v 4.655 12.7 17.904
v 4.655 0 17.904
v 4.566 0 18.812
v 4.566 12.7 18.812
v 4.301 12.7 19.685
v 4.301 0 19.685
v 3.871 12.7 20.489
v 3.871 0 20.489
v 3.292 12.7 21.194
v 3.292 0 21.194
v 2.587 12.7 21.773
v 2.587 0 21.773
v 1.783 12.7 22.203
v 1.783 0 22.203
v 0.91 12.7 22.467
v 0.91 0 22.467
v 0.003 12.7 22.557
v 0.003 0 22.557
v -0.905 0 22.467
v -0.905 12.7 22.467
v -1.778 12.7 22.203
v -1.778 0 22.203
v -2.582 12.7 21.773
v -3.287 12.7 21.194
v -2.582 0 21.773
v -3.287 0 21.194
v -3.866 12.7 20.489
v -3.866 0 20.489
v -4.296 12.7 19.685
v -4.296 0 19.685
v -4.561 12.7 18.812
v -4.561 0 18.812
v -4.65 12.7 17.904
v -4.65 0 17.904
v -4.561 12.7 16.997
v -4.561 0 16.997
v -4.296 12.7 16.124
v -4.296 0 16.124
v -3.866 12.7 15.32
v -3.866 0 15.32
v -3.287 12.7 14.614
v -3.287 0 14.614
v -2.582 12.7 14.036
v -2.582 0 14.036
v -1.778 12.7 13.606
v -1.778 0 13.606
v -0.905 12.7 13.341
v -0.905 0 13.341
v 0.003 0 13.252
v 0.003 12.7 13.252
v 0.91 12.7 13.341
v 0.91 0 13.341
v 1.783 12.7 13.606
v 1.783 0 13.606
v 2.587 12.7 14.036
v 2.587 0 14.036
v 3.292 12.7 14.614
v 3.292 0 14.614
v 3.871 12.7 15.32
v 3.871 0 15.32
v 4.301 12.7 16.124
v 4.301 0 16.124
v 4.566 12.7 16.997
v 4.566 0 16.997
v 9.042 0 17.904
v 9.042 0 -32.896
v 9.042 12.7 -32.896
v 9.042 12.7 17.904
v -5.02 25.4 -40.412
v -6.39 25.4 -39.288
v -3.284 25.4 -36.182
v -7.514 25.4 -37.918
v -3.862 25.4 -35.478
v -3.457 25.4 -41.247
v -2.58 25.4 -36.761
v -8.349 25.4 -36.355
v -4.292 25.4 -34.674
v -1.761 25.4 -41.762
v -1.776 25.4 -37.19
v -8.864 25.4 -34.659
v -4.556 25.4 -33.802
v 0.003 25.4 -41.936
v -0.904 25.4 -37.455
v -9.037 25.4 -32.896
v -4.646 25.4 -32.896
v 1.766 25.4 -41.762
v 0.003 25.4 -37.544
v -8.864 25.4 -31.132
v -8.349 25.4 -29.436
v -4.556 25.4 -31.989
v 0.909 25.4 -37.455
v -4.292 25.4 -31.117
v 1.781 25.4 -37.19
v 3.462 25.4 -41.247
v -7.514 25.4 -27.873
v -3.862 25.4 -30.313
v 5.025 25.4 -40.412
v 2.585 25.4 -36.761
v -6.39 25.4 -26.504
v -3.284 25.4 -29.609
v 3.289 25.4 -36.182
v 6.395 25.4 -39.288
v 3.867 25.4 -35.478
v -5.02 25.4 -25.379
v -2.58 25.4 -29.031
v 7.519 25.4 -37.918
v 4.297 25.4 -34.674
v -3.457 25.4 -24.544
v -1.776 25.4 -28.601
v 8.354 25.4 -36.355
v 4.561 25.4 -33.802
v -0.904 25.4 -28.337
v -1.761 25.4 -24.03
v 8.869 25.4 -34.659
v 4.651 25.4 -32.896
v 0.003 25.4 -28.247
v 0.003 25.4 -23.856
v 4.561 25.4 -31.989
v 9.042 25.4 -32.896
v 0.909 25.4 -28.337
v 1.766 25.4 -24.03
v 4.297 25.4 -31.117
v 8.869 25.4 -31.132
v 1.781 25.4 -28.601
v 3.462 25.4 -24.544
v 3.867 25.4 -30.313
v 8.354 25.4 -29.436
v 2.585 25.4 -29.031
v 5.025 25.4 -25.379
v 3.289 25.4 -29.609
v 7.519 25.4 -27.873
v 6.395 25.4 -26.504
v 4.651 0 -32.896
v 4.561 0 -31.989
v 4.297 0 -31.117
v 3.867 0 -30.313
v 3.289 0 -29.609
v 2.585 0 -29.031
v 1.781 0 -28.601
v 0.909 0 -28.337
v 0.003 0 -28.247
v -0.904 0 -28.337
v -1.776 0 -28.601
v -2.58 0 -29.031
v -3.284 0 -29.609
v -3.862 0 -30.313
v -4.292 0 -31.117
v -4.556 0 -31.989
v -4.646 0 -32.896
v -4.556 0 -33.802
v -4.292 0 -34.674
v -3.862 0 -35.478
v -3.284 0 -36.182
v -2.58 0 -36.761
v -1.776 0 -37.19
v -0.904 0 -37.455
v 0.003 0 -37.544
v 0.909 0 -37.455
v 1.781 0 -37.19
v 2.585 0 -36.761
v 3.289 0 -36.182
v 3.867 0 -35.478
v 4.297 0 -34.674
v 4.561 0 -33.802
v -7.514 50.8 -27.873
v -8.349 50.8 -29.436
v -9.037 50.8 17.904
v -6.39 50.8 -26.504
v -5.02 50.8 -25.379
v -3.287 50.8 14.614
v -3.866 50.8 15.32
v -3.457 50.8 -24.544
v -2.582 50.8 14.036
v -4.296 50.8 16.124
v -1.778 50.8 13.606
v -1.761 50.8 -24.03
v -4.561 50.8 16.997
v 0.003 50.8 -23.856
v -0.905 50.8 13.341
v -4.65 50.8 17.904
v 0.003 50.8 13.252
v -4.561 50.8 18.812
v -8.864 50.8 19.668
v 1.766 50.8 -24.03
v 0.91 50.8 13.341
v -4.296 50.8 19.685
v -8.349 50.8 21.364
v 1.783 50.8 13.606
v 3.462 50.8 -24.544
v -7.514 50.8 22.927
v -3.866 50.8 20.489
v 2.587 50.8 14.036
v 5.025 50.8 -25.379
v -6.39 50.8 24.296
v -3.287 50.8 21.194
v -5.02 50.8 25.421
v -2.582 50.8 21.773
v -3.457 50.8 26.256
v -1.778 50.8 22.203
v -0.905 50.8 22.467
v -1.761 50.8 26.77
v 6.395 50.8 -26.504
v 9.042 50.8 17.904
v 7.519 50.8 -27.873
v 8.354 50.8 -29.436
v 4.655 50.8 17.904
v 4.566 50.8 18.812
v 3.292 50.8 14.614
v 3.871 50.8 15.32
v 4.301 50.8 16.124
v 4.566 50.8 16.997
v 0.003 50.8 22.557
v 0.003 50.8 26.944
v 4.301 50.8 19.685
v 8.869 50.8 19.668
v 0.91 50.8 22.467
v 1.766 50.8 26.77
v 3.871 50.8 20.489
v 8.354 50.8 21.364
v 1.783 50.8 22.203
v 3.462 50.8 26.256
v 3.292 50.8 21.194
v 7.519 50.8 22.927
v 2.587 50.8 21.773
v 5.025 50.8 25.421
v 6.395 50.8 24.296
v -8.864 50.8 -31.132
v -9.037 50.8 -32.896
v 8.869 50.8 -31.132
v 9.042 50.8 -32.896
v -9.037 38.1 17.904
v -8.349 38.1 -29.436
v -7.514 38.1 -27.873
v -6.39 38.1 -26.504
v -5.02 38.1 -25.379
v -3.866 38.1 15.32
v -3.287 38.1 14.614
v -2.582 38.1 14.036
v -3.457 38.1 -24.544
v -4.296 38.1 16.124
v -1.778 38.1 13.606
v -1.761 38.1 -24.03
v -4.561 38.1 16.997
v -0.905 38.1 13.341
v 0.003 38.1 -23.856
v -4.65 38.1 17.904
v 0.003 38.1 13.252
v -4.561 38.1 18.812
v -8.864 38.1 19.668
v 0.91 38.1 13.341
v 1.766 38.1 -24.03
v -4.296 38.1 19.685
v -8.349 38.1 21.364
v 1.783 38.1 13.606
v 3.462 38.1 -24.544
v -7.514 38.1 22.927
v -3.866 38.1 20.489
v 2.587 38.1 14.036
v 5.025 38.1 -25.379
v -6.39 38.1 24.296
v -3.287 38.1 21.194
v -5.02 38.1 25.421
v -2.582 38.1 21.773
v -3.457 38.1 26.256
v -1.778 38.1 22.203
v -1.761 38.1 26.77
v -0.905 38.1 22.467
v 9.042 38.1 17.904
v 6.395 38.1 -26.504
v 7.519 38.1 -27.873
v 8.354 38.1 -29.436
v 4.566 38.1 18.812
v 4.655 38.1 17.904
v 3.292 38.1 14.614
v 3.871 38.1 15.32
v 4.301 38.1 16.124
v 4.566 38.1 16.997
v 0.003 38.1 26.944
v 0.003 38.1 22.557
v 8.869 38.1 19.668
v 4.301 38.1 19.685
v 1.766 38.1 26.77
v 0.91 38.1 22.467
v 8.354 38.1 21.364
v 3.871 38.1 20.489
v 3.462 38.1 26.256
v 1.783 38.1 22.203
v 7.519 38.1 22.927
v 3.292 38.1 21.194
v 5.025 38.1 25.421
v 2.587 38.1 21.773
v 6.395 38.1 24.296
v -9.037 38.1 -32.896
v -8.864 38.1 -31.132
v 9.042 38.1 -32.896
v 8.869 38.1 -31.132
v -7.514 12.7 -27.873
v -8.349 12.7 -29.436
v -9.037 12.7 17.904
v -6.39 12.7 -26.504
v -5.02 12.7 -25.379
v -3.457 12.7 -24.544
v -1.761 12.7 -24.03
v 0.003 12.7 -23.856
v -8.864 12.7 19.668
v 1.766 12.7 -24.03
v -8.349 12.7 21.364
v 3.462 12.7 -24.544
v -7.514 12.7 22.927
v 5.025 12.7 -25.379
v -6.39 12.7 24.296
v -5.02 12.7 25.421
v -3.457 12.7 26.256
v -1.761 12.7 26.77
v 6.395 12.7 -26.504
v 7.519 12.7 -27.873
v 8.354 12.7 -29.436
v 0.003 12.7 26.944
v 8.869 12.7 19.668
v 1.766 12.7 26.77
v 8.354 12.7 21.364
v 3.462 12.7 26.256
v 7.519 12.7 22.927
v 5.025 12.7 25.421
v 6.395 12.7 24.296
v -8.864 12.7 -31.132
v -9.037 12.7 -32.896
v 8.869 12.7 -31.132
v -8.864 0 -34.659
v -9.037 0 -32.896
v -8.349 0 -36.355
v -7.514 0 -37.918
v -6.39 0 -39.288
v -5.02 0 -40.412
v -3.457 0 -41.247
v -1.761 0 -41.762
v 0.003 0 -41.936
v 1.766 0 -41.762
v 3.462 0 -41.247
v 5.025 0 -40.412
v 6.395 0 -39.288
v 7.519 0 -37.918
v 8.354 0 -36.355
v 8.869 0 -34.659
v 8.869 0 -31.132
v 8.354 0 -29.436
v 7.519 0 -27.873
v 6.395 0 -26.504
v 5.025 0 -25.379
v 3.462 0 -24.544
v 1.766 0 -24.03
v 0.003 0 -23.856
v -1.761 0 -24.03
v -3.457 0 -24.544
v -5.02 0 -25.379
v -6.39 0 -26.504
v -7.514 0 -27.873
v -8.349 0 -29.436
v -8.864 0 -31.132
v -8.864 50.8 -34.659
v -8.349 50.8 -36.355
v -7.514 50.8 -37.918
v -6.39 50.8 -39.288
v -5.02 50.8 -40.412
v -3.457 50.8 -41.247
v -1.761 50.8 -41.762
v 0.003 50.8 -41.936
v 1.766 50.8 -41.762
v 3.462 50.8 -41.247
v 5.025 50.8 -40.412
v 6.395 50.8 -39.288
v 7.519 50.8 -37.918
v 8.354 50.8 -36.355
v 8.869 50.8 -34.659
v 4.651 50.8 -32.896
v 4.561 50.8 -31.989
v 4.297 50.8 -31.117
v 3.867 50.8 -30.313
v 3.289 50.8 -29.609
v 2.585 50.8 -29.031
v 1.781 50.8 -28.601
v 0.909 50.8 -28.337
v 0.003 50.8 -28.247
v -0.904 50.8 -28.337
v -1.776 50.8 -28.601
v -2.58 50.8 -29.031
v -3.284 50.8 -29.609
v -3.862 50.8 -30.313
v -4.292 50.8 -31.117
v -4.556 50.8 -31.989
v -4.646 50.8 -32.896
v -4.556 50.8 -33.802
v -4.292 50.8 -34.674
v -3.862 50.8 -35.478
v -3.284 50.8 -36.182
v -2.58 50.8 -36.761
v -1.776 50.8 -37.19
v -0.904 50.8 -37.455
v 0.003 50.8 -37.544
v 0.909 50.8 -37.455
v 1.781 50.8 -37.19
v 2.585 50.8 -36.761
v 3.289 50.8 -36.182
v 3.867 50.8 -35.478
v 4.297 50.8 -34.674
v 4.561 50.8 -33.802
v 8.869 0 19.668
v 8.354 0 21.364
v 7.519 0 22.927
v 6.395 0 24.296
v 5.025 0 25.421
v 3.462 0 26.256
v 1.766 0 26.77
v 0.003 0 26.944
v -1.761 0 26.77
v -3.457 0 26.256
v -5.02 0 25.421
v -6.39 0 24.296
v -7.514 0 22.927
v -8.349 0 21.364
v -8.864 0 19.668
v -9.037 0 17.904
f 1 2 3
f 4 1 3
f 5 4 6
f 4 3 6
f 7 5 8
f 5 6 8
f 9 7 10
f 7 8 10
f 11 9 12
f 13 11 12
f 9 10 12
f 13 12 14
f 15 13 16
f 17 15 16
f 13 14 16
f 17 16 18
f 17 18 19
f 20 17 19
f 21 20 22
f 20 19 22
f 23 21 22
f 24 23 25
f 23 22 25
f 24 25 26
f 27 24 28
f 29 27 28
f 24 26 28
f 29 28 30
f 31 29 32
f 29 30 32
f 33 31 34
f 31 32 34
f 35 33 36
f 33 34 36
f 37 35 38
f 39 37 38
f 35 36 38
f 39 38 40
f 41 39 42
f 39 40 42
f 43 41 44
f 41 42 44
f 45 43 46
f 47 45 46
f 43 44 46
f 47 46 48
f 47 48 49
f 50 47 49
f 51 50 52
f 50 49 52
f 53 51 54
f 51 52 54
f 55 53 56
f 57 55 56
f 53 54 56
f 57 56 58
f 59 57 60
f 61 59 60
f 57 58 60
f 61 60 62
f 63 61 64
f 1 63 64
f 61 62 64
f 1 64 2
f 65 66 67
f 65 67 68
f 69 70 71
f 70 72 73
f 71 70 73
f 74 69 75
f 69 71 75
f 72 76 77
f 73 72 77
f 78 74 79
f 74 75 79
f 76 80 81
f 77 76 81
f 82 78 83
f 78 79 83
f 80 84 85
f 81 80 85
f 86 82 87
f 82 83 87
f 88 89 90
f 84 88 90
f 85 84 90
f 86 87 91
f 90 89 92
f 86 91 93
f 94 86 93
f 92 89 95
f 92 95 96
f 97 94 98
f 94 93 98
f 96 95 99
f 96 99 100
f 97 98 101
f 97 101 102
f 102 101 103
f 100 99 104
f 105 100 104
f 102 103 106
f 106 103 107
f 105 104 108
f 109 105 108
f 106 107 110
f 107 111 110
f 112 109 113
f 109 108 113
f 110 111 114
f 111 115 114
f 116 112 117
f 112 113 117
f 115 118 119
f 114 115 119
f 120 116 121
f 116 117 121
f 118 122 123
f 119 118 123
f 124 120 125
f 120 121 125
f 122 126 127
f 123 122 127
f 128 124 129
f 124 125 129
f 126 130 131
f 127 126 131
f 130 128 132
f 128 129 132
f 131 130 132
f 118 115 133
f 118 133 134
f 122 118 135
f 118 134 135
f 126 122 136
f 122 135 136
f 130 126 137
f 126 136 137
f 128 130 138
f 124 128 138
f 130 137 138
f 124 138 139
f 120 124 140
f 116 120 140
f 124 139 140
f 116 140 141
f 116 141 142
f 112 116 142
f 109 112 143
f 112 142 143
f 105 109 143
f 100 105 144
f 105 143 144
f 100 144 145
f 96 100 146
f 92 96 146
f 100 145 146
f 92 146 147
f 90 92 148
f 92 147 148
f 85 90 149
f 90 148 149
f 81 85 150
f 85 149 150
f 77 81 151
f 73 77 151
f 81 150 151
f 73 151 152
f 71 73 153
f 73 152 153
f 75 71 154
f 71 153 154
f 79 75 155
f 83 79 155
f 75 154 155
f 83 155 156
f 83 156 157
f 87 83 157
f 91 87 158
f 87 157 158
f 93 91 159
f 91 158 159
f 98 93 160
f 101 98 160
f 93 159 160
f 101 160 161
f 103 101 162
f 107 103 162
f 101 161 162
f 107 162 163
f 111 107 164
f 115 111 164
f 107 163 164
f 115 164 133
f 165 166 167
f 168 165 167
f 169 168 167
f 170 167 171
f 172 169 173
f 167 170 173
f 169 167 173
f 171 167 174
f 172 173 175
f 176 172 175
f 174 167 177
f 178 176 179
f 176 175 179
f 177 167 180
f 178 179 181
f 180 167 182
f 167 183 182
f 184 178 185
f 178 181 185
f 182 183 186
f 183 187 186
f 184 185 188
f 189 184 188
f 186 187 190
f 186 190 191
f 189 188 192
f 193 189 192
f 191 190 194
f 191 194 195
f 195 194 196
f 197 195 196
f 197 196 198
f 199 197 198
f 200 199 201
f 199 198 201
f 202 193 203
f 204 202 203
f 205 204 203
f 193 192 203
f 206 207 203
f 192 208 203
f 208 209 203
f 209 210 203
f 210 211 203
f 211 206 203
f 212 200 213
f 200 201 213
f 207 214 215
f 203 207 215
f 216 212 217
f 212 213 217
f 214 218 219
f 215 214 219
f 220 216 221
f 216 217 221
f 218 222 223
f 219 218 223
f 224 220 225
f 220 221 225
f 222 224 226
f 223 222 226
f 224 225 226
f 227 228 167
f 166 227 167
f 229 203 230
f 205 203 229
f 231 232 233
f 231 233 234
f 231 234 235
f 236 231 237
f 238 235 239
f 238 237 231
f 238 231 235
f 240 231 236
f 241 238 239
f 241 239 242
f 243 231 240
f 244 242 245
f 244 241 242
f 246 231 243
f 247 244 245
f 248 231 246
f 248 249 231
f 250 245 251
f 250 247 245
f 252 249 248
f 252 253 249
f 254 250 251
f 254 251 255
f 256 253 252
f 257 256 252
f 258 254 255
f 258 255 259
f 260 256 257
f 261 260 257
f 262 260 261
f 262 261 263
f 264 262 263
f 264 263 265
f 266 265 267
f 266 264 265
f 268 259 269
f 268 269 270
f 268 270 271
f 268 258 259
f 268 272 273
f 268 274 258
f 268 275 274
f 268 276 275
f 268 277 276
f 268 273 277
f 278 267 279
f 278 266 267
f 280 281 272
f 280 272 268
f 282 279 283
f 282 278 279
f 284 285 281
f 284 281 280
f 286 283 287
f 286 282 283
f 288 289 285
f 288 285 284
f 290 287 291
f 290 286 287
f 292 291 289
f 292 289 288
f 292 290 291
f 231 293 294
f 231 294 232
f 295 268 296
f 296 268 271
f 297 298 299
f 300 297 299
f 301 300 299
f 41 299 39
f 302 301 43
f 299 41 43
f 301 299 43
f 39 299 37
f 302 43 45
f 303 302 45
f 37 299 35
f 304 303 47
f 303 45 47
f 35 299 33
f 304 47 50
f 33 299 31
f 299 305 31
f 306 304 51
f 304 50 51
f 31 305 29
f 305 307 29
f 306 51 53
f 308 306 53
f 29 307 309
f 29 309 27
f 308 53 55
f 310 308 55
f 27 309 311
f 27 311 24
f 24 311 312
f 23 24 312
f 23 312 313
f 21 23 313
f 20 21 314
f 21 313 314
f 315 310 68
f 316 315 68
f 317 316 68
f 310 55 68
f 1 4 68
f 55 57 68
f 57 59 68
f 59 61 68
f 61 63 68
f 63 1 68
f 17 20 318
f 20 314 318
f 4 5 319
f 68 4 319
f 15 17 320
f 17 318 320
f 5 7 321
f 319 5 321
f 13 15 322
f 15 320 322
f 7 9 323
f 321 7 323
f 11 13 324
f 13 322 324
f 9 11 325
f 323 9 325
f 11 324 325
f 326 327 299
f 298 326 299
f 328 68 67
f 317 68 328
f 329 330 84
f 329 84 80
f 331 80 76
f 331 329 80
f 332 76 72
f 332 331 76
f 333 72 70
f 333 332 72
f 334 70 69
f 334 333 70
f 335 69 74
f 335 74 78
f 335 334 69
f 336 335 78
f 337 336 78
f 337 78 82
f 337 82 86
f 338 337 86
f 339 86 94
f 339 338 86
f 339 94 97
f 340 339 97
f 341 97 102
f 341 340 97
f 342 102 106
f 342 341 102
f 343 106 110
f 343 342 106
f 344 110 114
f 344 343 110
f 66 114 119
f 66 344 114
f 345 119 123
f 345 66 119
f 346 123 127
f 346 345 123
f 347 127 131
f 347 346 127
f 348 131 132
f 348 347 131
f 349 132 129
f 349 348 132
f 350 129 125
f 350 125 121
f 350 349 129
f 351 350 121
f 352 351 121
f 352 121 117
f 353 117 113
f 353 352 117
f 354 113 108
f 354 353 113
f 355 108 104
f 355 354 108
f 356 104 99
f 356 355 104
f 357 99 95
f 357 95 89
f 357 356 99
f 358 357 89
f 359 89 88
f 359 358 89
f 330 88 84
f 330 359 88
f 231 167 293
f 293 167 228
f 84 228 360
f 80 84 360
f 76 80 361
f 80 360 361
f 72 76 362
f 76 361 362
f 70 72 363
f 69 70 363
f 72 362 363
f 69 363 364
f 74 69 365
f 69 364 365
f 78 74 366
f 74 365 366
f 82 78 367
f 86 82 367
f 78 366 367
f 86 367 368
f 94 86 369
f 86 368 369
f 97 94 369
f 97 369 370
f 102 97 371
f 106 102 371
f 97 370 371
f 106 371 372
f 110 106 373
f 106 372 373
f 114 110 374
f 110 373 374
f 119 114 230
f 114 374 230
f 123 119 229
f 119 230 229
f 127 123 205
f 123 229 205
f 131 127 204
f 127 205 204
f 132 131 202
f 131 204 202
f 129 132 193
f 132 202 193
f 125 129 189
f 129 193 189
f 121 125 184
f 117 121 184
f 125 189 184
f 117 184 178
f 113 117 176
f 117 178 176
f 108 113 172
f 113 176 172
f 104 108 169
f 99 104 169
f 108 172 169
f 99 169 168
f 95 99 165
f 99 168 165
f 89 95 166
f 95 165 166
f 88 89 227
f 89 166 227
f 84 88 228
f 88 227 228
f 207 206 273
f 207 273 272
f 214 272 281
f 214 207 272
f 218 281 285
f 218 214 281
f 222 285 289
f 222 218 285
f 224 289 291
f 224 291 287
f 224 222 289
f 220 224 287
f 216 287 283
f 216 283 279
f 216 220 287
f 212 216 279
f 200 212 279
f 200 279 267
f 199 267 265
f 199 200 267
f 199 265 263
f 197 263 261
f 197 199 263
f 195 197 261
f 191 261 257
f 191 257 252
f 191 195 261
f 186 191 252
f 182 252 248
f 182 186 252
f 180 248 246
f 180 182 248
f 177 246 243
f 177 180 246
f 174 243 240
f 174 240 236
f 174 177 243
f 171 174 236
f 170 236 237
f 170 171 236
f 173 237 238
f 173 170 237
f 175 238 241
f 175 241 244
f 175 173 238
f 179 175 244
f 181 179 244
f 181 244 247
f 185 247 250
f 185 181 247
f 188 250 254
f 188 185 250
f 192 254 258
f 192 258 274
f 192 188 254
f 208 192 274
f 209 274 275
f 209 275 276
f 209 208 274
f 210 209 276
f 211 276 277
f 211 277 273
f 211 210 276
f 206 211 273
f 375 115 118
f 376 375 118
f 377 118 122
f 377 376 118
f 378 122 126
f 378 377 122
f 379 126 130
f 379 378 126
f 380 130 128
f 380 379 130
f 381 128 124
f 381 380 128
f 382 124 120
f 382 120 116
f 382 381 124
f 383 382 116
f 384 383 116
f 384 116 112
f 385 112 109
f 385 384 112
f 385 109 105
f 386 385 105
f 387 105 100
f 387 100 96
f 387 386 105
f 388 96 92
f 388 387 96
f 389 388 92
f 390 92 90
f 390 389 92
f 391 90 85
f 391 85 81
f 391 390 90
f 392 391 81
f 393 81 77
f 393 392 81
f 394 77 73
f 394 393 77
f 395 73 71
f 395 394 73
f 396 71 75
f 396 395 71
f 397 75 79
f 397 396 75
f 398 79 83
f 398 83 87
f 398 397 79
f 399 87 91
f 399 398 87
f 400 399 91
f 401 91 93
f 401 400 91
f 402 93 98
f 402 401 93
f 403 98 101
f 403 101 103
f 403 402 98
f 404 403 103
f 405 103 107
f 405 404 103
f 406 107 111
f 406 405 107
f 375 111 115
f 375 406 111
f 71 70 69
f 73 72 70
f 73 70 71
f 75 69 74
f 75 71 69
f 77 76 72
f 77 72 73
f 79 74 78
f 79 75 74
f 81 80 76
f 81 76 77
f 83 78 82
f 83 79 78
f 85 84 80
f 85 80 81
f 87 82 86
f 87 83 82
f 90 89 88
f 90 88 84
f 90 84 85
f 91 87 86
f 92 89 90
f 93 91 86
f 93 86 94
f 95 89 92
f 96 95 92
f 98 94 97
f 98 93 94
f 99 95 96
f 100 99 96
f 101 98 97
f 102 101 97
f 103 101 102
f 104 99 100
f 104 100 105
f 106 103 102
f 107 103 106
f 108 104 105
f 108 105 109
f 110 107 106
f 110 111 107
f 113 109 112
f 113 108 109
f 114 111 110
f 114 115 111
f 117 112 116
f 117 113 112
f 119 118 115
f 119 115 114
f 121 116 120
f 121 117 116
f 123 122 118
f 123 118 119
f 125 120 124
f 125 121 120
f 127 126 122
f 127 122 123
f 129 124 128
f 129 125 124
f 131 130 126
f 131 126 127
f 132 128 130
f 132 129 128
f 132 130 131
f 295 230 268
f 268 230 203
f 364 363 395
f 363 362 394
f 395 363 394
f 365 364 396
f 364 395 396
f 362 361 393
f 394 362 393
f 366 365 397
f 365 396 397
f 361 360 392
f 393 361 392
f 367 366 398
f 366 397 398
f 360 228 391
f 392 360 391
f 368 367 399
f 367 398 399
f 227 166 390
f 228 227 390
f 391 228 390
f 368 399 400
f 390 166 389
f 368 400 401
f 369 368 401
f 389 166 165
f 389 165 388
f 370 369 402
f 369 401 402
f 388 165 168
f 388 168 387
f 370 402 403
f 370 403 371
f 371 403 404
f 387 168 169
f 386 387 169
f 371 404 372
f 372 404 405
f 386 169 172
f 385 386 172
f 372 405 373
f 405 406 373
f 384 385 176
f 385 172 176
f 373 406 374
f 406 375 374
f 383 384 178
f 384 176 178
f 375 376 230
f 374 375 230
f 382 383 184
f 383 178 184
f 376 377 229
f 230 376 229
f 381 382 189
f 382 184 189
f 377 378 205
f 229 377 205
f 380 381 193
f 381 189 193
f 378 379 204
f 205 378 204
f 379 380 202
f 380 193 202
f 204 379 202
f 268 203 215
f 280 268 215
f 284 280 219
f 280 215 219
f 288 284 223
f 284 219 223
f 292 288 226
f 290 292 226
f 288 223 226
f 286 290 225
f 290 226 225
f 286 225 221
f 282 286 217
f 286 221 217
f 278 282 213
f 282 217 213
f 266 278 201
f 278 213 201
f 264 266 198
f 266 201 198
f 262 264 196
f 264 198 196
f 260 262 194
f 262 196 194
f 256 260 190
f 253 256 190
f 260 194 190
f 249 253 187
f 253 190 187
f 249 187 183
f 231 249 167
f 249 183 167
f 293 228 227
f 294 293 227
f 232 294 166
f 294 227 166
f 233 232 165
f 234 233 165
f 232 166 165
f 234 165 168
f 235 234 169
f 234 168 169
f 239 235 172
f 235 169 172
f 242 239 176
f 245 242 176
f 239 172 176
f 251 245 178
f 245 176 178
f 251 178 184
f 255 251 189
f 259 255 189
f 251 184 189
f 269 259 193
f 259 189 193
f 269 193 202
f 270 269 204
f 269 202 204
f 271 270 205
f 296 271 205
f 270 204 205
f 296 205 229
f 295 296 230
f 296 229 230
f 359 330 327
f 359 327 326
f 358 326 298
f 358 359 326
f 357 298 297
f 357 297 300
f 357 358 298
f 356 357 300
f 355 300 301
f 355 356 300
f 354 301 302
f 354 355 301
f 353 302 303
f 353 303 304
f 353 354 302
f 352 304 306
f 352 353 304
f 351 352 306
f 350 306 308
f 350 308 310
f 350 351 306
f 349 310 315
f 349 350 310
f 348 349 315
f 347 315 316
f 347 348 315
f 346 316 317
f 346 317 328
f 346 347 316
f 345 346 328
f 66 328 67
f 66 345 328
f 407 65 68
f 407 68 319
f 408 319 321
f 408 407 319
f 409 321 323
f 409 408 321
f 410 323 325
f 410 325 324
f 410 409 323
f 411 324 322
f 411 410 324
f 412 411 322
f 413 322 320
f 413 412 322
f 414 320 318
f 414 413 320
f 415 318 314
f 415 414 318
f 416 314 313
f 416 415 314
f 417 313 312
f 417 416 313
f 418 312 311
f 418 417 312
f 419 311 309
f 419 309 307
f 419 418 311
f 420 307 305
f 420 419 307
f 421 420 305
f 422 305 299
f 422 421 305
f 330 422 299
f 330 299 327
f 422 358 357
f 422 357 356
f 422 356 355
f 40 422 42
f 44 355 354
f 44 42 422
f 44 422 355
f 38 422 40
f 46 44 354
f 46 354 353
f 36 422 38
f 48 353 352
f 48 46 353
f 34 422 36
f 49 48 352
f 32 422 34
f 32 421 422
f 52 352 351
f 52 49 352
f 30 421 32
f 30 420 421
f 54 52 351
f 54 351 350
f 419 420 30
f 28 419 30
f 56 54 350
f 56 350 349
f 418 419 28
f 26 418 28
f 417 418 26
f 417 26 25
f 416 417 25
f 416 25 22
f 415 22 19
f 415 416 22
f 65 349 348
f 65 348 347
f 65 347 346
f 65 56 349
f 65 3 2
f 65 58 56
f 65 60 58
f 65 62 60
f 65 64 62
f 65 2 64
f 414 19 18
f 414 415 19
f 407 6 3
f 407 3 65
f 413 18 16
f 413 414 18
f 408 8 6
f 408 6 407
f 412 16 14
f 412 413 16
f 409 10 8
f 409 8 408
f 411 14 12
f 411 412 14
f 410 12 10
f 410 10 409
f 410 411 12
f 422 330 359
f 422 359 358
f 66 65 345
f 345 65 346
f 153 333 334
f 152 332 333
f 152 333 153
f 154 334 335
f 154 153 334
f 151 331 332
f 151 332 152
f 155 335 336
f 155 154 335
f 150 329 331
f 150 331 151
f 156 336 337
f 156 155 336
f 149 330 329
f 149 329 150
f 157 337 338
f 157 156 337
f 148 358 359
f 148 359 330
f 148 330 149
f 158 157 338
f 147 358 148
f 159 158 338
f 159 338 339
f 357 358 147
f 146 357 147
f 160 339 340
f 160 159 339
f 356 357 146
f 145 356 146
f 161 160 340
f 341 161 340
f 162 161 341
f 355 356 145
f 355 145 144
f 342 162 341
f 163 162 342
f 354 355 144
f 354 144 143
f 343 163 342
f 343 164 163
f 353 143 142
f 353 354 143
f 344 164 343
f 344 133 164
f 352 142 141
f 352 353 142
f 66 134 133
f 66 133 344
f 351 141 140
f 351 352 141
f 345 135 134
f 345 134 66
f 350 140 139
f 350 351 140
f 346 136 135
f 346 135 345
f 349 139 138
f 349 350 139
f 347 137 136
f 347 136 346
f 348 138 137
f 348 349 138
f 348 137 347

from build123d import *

# Parameters (mm, degrees)
F0_R     = 4.652524
F1_DEPTH = 12.7
F0_R_2   = 4.6482
F2_DEPTH = 25.4


with BuildPart() as f1:
    # F0 (on Front) → F1 (new body)
    with BuildSketch(Plane.XZ):
        with BuildLine():
            Line((-9.037275, 17.904323), (-9.037275, -32.895677))
            ThreePointArc((-9.037275, -32.895677), (0.002563, -23.855839), (9.0424, -32.895677))
            Line((9.0424, -32.895677), (9.0424, 17.904323))
            ThreePointArc((9.0424, 17.904323), (0.002563, 26.944161), (-9.037275, 17.904323))
        make_face()
        with Locations((0.002563, 17.904323)):
            Circle(F0_R, mode=Mode.SUBTRACT)
    extrude(amount=-F1_DEPTH)


with BuildPart() as f2:
    # F0 (on Front) → F2 (new body)
    with BuildSketch(Plane.XZ):
        with BuildLine():
            ThreePointArc((9.0424, -32.895677), (0.002563, -23.855839), (-9.037275, -32.895677))
            ThreePointArc((-9.037275, -32.895677), (0.002563, -41.935514), (9.0424, -32.895677))
        make_face()
        with Locations((0.002563, -32.895677)):
            Circle(F0_R_2, mode=Mode.SUBTRACT)
    extrude(amount=-F2_DEPTH)


with BuildPart() as f3_1:
    # F3: instance of F1
    add(f1.part.mirror(Plane(origin=(0.002563, 25.4, -32.895677), x_dir=(1, 0, 0), z_dir=(0, 1, 0))))


with BuildPart() as f3_2:
    # F3: instance of F2
    add(f2.part.mirror(Plane(origin=(0.002563, 25.4, -32.895677), x_dir=(1, 0, 0), z_dir=(0, 1, 0))))


solid = Compound([f1.part, f2.part, f3_1.part, f3_2.part])
